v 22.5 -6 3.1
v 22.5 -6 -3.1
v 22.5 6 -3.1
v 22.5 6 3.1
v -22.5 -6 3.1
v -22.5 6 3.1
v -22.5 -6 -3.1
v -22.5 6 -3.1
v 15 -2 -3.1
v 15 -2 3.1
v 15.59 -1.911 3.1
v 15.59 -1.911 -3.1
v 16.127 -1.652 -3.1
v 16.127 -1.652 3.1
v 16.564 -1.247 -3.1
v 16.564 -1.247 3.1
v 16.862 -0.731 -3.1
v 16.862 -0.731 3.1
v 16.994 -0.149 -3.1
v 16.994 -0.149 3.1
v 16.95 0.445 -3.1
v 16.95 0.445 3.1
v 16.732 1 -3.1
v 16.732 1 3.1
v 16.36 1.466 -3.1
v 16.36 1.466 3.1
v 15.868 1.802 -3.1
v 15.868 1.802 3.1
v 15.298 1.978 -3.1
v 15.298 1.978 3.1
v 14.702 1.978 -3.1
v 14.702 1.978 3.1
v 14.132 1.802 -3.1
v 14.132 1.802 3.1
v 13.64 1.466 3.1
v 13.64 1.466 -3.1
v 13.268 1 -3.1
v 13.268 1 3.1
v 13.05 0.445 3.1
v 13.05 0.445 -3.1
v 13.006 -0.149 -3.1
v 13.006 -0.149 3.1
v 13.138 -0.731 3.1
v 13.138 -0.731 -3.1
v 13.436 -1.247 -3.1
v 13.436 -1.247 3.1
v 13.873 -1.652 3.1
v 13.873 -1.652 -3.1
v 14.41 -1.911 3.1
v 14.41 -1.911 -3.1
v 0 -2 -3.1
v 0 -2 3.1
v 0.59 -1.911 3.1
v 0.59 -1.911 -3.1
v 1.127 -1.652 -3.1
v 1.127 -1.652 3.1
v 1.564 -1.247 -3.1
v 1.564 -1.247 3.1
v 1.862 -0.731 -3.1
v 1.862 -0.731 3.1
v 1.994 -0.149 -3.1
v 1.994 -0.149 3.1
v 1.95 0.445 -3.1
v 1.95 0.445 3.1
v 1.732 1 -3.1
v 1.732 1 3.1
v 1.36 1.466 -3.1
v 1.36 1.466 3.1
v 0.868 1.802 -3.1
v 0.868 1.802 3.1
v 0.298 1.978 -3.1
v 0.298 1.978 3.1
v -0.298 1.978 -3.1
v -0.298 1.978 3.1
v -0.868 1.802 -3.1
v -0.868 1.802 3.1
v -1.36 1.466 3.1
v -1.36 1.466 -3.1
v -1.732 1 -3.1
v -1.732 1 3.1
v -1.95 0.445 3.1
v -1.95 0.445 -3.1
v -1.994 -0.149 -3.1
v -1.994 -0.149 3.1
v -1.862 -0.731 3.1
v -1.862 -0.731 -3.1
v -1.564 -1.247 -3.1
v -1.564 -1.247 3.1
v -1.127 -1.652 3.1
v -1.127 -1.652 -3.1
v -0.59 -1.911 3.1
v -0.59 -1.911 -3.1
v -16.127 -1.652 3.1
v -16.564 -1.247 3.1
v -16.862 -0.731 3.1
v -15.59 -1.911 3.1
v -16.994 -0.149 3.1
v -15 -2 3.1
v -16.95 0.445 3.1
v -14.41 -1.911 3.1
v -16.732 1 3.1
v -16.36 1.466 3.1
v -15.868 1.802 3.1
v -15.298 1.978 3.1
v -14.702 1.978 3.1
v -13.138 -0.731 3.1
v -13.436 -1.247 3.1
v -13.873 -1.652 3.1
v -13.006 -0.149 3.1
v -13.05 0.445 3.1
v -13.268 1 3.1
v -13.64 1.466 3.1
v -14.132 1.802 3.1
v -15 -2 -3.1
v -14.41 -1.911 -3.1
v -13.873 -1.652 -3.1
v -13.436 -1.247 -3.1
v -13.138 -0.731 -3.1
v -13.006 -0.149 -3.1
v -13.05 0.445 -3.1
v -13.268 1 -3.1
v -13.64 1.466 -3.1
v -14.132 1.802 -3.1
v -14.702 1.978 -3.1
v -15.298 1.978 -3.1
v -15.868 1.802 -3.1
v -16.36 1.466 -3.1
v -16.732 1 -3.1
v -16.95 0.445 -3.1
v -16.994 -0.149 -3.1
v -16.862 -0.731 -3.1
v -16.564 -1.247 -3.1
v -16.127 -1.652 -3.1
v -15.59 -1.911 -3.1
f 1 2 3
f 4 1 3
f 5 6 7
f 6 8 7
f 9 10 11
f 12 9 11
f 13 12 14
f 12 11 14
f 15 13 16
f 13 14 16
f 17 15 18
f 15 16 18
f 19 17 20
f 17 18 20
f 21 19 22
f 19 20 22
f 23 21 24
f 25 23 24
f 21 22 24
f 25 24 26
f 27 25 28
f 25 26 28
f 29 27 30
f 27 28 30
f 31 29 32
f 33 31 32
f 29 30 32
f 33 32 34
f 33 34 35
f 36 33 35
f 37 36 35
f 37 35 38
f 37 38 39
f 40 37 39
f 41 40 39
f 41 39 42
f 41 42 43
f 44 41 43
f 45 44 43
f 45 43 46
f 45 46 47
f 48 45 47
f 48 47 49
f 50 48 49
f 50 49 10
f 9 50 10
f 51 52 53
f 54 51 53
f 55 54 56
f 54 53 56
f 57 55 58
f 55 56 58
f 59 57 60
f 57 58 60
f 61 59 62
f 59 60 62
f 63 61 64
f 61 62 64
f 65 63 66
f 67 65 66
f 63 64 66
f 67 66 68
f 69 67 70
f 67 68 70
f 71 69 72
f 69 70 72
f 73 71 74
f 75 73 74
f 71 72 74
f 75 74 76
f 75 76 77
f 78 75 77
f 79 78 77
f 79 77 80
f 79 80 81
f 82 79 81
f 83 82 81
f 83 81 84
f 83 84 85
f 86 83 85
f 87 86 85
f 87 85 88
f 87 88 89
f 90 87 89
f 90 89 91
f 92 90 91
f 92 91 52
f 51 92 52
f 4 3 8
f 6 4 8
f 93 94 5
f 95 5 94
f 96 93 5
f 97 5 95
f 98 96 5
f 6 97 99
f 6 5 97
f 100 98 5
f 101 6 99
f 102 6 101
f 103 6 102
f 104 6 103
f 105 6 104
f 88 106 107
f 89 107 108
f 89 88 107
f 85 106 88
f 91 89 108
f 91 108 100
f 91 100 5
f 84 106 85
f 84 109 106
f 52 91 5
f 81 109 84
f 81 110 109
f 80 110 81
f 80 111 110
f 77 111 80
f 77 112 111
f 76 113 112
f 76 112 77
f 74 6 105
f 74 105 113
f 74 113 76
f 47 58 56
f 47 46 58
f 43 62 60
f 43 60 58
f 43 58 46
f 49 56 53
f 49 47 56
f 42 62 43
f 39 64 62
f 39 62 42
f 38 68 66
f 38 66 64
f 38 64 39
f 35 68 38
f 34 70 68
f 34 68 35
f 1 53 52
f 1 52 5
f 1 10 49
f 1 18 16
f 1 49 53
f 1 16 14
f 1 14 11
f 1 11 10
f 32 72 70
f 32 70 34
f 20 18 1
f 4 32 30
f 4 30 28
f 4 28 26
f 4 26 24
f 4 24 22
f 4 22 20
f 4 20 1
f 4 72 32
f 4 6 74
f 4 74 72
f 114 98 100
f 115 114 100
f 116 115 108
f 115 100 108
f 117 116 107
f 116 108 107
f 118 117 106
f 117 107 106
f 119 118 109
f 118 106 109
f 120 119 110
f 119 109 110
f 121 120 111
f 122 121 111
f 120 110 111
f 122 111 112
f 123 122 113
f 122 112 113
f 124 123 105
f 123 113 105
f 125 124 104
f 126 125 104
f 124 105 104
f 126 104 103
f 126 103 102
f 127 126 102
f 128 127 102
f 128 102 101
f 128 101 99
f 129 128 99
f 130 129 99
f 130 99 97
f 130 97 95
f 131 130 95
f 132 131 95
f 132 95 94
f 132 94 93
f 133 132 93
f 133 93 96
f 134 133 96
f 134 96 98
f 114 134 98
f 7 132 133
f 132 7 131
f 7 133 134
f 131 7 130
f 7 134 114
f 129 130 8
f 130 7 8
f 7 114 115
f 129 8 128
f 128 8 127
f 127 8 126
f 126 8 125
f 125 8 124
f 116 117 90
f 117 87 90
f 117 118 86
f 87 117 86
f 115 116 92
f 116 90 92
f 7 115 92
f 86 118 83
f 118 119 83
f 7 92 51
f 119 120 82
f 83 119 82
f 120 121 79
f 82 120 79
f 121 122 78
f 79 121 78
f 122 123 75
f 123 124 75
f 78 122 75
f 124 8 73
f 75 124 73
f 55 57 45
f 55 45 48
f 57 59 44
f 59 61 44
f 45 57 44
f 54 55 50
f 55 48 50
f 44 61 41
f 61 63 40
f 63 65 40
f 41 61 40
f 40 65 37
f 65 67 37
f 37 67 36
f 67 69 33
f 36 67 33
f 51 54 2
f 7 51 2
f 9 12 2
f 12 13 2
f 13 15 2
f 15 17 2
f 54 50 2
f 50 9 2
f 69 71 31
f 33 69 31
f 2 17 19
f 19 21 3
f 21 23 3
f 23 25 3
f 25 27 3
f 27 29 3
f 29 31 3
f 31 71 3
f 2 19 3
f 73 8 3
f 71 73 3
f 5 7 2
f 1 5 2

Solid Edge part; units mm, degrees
sketch "Sketch1" plane through (0, 0, 0) normal (0, 0, 1) x (1, 0, 0)
  line L0 (-22.5, -6) -> (22.5, -6)
  line L1 (22.5, -6) -> (22.5, 6)
  line L2 (22.5, 6) -> (-22.5, 6)
  line L3 (-22.5, 6) -> (-22.5, -6)
  dimension "D1" = 45
  dimension "D2" = 12
extrude "Protrusion1" add sketch "Sketch1" along normal mid plane 6.2
hole "Hole_1" at (-15, 0, 3.1) direction (0, 0, -1) diameter 4 end up to next
hole "Hole1" at (0, 0, 3.1) direction (0, 0, -1) diameter 4 end up to next
hole "Hole2" at (15, 0, 3.1) direction (0, 0, -1) diameter 4 end up to next
properties material "Polyethylene, low density"
